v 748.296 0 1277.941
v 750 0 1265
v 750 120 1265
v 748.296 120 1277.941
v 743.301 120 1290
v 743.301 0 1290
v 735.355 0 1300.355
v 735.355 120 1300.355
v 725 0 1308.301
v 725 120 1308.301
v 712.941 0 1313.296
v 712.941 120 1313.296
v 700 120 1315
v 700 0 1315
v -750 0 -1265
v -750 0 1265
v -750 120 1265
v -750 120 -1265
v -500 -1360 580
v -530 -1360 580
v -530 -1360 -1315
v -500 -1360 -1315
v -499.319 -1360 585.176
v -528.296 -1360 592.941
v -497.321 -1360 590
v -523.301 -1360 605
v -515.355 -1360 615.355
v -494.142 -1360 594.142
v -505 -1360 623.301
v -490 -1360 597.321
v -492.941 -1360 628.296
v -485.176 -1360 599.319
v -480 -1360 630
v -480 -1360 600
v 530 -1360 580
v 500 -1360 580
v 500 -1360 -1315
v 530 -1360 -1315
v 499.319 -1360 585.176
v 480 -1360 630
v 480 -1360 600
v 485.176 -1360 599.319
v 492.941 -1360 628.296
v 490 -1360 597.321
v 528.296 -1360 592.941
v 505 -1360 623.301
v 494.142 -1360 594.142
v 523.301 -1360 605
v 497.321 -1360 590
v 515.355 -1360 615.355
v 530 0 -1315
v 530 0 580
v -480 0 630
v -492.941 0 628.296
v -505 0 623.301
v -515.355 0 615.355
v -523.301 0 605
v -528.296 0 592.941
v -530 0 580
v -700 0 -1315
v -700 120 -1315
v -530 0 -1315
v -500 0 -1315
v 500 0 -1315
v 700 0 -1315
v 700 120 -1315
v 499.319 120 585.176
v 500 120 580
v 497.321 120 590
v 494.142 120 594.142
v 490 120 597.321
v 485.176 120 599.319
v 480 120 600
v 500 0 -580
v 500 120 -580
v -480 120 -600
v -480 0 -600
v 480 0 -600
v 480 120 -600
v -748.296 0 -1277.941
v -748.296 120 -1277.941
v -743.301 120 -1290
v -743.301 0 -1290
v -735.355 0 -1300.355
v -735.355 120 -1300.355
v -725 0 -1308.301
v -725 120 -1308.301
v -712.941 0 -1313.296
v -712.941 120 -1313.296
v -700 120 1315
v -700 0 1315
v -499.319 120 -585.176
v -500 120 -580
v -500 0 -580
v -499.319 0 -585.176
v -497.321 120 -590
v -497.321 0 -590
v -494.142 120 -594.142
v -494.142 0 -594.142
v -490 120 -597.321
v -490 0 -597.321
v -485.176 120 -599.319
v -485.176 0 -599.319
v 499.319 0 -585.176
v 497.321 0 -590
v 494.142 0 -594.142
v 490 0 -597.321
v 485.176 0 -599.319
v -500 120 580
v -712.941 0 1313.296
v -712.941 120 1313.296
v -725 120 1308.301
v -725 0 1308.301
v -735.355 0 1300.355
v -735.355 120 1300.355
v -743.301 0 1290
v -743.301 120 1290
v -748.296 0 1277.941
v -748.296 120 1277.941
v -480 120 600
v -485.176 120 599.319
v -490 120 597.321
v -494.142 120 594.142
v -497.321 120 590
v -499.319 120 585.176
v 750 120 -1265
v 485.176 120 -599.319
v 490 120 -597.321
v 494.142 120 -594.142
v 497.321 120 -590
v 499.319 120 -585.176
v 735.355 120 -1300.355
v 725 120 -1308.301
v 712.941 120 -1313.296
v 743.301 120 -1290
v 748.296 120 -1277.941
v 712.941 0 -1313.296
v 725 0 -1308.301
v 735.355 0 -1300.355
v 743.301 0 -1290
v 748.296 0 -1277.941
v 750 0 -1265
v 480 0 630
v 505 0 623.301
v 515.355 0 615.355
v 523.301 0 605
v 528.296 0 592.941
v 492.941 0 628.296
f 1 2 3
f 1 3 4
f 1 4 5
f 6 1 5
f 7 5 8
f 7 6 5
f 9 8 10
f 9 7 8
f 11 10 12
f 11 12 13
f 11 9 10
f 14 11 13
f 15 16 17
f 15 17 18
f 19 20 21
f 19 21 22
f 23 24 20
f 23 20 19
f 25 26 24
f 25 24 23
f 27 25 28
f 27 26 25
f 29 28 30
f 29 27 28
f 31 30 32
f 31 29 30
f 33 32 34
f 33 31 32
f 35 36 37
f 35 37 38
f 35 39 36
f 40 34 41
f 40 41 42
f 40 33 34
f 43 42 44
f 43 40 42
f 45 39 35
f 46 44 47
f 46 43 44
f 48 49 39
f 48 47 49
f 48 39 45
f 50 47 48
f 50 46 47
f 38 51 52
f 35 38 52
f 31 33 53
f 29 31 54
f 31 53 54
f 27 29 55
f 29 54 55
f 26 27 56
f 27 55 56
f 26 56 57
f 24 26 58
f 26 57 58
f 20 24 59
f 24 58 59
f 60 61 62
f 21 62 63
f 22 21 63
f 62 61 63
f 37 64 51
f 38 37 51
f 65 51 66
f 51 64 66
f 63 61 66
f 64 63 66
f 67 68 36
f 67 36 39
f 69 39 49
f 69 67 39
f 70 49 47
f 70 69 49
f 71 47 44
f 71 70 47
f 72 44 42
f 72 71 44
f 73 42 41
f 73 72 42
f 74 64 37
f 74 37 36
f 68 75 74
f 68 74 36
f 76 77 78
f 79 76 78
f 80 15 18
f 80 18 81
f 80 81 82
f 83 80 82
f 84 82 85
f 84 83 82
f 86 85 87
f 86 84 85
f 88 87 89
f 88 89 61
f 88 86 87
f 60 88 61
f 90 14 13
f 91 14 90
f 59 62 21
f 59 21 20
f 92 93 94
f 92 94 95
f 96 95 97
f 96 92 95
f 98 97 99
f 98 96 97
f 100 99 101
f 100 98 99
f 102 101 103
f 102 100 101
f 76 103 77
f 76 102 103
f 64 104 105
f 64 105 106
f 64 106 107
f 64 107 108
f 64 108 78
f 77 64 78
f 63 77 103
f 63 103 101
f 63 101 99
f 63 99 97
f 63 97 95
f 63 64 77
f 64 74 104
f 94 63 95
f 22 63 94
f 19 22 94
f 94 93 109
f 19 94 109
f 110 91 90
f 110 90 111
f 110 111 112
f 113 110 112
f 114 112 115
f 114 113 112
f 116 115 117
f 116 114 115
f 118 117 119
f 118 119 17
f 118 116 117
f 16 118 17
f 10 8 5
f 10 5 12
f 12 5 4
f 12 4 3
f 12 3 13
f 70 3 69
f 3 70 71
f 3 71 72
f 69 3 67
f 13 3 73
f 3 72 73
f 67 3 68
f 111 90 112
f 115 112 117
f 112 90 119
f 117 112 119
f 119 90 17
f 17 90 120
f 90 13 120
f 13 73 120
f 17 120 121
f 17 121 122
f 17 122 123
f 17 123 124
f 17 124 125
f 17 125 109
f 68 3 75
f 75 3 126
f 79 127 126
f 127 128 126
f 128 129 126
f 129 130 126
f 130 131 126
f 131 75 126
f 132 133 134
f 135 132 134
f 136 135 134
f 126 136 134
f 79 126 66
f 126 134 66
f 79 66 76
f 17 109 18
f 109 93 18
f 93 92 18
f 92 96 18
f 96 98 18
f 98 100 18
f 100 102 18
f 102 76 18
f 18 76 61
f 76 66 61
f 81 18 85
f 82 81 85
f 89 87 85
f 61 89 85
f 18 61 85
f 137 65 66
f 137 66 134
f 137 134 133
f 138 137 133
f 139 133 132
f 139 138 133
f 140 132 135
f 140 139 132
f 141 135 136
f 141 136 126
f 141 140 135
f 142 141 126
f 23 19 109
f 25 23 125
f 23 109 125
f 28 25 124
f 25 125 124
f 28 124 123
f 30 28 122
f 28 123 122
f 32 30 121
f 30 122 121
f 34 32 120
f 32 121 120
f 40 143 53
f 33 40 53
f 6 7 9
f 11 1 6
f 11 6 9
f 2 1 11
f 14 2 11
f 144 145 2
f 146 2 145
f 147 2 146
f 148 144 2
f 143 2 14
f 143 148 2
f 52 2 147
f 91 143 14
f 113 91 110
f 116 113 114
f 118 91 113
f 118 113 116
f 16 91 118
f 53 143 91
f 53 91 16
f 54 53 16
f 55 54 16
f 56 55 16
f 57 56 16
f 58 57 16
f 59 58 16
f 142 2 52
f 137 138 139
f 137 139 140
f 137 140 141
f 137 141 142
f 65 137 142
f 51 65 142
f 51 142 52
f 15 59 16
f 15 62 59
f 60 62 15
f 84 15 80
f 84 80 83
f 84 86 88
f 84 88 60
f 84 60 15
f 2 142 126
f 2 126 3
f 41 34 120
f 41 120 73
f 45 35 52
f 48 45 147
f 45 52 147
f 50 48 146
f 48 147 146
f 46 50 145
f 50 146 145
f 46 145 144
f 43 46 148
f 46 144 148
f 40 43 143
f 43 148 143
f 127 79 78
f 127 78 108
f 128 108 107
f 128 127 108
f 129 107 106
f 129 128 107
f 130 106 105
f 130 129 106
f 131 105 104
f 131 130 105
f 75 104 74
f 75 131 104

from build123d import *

# Parameters (mm, degrees)
CROQUIS1_W              = 1000
CROQUIS1_H              = 1200
SALIENTE_EXTRUIR1_DEPTH = 120
REDONDEO1_R             = 20
SALIENTE_EXTRUIR2_DEPTH = 1480
CROQUIS3_W              = 30
CROQUIS3_H              = 735
SALIENTE_EXTRUIR3_DEPTH = 1360
CORTAR_EXTRUIR1_DEPTH   = 1360


with BuildPart() as part:
    # Croquis1 → Saliente-Extruir1 (new body)
    with BuildSketch(Plane(origin=(0, 0, 0), x_dir=(1, 0, 0), z_dir=(0, 1, 0))):
        with BuildLine():
            Line((-700, 1315), (700, 1315))
            ThreePointArc((700, 1315), (735.355339059, 1300.355339059), (750, 1265))
            Line((750, 1265), (750, -1265))
            ThreePointArc((750, -1265), (735.355339059, -1300.355339059), (700, -1315))
            Line((700, -1315), (-700, -1315))
            ThreePointArc((-700, -1315), (-735.355339059, -1300.355339059), (-750, -1265))
            Line((-750, -1265), (-750, 1265))
            ThreePointArc((-750, 1265), (-735.355339059, 1300.355339059), (-700, 1315))
        make_face()
        Rectangle(CROQUIS1_W, CROQUIS1_H, mode=Mode.SUBTRACT)
    extrude(amount=SALIENTE_EXTRUIR1_DEPTH)

    # Redondeo1
    redondeo1_edges = [part.edges().sort_by_distance(p)[0] for p in [
        (500, 60, 600),
        (500, 60, -600),
        (-500, 60, -600),
        (-500, 60, 600),
    ]]
    fillet(redondeo1_edges, radius=REDONDEO1_R)

    # Croquis2 → Saliente-Extruir2 (add)
    with BuildSketch(Plane(origin=(0, 120, 0), x_dir=(1, 0, 0), z_dir=(0, 1, 0))):
        with BuildLine():
            Line((-530, -580), (-530, 580))
            ThreePointArc((-530, 580), (-515.355339059, 615.355339059), (-480, 630))
            Line((-480, 630), (480, 630))
            ThreePointArc((480, 630), (515.355339059, 615.355339059), (530, 580))
            Line((530, 580), (530, -580))
            ThreePointArc((530, -580), (515.355339059, -615.355339059), (480, -630))
            Line((480, -630), (-480, -630))
            ThreePointArc((-480, -630), (-515.355339059, -615.355339059), (-530, -580))
        make_face()
        with BuildLine():
            Line((-500, -580), (-500, 580))
            ThreePointArc((-500, 580), (-494.142135624, 594.142135624), (-480, 600))
            Line((-480, 600), (480, 600))
            ThreePointArc((480, 600), (494.142135624, 594.142135624), (500, 580))
            Line((500, 580), (500, -580))
            ThreePointArc((500, -580), (494.142135624, -594.142135624), (480, -600))
            Line((480, -600), (-480, -600))
            ThreePointArc((-480, -600), (-494.142135624, -594.142135624), (-500, -580))
        make_face(mode=Mode.SUBTRACT)
    extrude(amount=-SALIENTE_EXTRUIR2_DEPTH)

    # Croquis3 → Saliente-Extruir3 (add)
    with BuildSketch(Plane.XZ):
        with Locations((515, -947.5)):
            Rectangle(CROQUIS3_W, CROQUIS3_H)
        with Locations((-515, -947.5)):
            Rectangle(CROQUIS3_W, CROQUIS3_H)
    extrude(amount=SALIENTE_EXTRUIR3_DEPTH)

    # Croquis4 → Cortar-Extruir1 (cut)
    with BuildSketch(Plane.XZ.offset(1360)):
        Polygon((500, -580), (500, -639.785784225), (-500, -639.785784225), (-500, -563.731822734), (500, -563.731822734), align=None)
    extrude(amount=-CORTAR_EXTRUIR1_DEPTH, mode=Mode.SUBTRACT)


solid = part.part
